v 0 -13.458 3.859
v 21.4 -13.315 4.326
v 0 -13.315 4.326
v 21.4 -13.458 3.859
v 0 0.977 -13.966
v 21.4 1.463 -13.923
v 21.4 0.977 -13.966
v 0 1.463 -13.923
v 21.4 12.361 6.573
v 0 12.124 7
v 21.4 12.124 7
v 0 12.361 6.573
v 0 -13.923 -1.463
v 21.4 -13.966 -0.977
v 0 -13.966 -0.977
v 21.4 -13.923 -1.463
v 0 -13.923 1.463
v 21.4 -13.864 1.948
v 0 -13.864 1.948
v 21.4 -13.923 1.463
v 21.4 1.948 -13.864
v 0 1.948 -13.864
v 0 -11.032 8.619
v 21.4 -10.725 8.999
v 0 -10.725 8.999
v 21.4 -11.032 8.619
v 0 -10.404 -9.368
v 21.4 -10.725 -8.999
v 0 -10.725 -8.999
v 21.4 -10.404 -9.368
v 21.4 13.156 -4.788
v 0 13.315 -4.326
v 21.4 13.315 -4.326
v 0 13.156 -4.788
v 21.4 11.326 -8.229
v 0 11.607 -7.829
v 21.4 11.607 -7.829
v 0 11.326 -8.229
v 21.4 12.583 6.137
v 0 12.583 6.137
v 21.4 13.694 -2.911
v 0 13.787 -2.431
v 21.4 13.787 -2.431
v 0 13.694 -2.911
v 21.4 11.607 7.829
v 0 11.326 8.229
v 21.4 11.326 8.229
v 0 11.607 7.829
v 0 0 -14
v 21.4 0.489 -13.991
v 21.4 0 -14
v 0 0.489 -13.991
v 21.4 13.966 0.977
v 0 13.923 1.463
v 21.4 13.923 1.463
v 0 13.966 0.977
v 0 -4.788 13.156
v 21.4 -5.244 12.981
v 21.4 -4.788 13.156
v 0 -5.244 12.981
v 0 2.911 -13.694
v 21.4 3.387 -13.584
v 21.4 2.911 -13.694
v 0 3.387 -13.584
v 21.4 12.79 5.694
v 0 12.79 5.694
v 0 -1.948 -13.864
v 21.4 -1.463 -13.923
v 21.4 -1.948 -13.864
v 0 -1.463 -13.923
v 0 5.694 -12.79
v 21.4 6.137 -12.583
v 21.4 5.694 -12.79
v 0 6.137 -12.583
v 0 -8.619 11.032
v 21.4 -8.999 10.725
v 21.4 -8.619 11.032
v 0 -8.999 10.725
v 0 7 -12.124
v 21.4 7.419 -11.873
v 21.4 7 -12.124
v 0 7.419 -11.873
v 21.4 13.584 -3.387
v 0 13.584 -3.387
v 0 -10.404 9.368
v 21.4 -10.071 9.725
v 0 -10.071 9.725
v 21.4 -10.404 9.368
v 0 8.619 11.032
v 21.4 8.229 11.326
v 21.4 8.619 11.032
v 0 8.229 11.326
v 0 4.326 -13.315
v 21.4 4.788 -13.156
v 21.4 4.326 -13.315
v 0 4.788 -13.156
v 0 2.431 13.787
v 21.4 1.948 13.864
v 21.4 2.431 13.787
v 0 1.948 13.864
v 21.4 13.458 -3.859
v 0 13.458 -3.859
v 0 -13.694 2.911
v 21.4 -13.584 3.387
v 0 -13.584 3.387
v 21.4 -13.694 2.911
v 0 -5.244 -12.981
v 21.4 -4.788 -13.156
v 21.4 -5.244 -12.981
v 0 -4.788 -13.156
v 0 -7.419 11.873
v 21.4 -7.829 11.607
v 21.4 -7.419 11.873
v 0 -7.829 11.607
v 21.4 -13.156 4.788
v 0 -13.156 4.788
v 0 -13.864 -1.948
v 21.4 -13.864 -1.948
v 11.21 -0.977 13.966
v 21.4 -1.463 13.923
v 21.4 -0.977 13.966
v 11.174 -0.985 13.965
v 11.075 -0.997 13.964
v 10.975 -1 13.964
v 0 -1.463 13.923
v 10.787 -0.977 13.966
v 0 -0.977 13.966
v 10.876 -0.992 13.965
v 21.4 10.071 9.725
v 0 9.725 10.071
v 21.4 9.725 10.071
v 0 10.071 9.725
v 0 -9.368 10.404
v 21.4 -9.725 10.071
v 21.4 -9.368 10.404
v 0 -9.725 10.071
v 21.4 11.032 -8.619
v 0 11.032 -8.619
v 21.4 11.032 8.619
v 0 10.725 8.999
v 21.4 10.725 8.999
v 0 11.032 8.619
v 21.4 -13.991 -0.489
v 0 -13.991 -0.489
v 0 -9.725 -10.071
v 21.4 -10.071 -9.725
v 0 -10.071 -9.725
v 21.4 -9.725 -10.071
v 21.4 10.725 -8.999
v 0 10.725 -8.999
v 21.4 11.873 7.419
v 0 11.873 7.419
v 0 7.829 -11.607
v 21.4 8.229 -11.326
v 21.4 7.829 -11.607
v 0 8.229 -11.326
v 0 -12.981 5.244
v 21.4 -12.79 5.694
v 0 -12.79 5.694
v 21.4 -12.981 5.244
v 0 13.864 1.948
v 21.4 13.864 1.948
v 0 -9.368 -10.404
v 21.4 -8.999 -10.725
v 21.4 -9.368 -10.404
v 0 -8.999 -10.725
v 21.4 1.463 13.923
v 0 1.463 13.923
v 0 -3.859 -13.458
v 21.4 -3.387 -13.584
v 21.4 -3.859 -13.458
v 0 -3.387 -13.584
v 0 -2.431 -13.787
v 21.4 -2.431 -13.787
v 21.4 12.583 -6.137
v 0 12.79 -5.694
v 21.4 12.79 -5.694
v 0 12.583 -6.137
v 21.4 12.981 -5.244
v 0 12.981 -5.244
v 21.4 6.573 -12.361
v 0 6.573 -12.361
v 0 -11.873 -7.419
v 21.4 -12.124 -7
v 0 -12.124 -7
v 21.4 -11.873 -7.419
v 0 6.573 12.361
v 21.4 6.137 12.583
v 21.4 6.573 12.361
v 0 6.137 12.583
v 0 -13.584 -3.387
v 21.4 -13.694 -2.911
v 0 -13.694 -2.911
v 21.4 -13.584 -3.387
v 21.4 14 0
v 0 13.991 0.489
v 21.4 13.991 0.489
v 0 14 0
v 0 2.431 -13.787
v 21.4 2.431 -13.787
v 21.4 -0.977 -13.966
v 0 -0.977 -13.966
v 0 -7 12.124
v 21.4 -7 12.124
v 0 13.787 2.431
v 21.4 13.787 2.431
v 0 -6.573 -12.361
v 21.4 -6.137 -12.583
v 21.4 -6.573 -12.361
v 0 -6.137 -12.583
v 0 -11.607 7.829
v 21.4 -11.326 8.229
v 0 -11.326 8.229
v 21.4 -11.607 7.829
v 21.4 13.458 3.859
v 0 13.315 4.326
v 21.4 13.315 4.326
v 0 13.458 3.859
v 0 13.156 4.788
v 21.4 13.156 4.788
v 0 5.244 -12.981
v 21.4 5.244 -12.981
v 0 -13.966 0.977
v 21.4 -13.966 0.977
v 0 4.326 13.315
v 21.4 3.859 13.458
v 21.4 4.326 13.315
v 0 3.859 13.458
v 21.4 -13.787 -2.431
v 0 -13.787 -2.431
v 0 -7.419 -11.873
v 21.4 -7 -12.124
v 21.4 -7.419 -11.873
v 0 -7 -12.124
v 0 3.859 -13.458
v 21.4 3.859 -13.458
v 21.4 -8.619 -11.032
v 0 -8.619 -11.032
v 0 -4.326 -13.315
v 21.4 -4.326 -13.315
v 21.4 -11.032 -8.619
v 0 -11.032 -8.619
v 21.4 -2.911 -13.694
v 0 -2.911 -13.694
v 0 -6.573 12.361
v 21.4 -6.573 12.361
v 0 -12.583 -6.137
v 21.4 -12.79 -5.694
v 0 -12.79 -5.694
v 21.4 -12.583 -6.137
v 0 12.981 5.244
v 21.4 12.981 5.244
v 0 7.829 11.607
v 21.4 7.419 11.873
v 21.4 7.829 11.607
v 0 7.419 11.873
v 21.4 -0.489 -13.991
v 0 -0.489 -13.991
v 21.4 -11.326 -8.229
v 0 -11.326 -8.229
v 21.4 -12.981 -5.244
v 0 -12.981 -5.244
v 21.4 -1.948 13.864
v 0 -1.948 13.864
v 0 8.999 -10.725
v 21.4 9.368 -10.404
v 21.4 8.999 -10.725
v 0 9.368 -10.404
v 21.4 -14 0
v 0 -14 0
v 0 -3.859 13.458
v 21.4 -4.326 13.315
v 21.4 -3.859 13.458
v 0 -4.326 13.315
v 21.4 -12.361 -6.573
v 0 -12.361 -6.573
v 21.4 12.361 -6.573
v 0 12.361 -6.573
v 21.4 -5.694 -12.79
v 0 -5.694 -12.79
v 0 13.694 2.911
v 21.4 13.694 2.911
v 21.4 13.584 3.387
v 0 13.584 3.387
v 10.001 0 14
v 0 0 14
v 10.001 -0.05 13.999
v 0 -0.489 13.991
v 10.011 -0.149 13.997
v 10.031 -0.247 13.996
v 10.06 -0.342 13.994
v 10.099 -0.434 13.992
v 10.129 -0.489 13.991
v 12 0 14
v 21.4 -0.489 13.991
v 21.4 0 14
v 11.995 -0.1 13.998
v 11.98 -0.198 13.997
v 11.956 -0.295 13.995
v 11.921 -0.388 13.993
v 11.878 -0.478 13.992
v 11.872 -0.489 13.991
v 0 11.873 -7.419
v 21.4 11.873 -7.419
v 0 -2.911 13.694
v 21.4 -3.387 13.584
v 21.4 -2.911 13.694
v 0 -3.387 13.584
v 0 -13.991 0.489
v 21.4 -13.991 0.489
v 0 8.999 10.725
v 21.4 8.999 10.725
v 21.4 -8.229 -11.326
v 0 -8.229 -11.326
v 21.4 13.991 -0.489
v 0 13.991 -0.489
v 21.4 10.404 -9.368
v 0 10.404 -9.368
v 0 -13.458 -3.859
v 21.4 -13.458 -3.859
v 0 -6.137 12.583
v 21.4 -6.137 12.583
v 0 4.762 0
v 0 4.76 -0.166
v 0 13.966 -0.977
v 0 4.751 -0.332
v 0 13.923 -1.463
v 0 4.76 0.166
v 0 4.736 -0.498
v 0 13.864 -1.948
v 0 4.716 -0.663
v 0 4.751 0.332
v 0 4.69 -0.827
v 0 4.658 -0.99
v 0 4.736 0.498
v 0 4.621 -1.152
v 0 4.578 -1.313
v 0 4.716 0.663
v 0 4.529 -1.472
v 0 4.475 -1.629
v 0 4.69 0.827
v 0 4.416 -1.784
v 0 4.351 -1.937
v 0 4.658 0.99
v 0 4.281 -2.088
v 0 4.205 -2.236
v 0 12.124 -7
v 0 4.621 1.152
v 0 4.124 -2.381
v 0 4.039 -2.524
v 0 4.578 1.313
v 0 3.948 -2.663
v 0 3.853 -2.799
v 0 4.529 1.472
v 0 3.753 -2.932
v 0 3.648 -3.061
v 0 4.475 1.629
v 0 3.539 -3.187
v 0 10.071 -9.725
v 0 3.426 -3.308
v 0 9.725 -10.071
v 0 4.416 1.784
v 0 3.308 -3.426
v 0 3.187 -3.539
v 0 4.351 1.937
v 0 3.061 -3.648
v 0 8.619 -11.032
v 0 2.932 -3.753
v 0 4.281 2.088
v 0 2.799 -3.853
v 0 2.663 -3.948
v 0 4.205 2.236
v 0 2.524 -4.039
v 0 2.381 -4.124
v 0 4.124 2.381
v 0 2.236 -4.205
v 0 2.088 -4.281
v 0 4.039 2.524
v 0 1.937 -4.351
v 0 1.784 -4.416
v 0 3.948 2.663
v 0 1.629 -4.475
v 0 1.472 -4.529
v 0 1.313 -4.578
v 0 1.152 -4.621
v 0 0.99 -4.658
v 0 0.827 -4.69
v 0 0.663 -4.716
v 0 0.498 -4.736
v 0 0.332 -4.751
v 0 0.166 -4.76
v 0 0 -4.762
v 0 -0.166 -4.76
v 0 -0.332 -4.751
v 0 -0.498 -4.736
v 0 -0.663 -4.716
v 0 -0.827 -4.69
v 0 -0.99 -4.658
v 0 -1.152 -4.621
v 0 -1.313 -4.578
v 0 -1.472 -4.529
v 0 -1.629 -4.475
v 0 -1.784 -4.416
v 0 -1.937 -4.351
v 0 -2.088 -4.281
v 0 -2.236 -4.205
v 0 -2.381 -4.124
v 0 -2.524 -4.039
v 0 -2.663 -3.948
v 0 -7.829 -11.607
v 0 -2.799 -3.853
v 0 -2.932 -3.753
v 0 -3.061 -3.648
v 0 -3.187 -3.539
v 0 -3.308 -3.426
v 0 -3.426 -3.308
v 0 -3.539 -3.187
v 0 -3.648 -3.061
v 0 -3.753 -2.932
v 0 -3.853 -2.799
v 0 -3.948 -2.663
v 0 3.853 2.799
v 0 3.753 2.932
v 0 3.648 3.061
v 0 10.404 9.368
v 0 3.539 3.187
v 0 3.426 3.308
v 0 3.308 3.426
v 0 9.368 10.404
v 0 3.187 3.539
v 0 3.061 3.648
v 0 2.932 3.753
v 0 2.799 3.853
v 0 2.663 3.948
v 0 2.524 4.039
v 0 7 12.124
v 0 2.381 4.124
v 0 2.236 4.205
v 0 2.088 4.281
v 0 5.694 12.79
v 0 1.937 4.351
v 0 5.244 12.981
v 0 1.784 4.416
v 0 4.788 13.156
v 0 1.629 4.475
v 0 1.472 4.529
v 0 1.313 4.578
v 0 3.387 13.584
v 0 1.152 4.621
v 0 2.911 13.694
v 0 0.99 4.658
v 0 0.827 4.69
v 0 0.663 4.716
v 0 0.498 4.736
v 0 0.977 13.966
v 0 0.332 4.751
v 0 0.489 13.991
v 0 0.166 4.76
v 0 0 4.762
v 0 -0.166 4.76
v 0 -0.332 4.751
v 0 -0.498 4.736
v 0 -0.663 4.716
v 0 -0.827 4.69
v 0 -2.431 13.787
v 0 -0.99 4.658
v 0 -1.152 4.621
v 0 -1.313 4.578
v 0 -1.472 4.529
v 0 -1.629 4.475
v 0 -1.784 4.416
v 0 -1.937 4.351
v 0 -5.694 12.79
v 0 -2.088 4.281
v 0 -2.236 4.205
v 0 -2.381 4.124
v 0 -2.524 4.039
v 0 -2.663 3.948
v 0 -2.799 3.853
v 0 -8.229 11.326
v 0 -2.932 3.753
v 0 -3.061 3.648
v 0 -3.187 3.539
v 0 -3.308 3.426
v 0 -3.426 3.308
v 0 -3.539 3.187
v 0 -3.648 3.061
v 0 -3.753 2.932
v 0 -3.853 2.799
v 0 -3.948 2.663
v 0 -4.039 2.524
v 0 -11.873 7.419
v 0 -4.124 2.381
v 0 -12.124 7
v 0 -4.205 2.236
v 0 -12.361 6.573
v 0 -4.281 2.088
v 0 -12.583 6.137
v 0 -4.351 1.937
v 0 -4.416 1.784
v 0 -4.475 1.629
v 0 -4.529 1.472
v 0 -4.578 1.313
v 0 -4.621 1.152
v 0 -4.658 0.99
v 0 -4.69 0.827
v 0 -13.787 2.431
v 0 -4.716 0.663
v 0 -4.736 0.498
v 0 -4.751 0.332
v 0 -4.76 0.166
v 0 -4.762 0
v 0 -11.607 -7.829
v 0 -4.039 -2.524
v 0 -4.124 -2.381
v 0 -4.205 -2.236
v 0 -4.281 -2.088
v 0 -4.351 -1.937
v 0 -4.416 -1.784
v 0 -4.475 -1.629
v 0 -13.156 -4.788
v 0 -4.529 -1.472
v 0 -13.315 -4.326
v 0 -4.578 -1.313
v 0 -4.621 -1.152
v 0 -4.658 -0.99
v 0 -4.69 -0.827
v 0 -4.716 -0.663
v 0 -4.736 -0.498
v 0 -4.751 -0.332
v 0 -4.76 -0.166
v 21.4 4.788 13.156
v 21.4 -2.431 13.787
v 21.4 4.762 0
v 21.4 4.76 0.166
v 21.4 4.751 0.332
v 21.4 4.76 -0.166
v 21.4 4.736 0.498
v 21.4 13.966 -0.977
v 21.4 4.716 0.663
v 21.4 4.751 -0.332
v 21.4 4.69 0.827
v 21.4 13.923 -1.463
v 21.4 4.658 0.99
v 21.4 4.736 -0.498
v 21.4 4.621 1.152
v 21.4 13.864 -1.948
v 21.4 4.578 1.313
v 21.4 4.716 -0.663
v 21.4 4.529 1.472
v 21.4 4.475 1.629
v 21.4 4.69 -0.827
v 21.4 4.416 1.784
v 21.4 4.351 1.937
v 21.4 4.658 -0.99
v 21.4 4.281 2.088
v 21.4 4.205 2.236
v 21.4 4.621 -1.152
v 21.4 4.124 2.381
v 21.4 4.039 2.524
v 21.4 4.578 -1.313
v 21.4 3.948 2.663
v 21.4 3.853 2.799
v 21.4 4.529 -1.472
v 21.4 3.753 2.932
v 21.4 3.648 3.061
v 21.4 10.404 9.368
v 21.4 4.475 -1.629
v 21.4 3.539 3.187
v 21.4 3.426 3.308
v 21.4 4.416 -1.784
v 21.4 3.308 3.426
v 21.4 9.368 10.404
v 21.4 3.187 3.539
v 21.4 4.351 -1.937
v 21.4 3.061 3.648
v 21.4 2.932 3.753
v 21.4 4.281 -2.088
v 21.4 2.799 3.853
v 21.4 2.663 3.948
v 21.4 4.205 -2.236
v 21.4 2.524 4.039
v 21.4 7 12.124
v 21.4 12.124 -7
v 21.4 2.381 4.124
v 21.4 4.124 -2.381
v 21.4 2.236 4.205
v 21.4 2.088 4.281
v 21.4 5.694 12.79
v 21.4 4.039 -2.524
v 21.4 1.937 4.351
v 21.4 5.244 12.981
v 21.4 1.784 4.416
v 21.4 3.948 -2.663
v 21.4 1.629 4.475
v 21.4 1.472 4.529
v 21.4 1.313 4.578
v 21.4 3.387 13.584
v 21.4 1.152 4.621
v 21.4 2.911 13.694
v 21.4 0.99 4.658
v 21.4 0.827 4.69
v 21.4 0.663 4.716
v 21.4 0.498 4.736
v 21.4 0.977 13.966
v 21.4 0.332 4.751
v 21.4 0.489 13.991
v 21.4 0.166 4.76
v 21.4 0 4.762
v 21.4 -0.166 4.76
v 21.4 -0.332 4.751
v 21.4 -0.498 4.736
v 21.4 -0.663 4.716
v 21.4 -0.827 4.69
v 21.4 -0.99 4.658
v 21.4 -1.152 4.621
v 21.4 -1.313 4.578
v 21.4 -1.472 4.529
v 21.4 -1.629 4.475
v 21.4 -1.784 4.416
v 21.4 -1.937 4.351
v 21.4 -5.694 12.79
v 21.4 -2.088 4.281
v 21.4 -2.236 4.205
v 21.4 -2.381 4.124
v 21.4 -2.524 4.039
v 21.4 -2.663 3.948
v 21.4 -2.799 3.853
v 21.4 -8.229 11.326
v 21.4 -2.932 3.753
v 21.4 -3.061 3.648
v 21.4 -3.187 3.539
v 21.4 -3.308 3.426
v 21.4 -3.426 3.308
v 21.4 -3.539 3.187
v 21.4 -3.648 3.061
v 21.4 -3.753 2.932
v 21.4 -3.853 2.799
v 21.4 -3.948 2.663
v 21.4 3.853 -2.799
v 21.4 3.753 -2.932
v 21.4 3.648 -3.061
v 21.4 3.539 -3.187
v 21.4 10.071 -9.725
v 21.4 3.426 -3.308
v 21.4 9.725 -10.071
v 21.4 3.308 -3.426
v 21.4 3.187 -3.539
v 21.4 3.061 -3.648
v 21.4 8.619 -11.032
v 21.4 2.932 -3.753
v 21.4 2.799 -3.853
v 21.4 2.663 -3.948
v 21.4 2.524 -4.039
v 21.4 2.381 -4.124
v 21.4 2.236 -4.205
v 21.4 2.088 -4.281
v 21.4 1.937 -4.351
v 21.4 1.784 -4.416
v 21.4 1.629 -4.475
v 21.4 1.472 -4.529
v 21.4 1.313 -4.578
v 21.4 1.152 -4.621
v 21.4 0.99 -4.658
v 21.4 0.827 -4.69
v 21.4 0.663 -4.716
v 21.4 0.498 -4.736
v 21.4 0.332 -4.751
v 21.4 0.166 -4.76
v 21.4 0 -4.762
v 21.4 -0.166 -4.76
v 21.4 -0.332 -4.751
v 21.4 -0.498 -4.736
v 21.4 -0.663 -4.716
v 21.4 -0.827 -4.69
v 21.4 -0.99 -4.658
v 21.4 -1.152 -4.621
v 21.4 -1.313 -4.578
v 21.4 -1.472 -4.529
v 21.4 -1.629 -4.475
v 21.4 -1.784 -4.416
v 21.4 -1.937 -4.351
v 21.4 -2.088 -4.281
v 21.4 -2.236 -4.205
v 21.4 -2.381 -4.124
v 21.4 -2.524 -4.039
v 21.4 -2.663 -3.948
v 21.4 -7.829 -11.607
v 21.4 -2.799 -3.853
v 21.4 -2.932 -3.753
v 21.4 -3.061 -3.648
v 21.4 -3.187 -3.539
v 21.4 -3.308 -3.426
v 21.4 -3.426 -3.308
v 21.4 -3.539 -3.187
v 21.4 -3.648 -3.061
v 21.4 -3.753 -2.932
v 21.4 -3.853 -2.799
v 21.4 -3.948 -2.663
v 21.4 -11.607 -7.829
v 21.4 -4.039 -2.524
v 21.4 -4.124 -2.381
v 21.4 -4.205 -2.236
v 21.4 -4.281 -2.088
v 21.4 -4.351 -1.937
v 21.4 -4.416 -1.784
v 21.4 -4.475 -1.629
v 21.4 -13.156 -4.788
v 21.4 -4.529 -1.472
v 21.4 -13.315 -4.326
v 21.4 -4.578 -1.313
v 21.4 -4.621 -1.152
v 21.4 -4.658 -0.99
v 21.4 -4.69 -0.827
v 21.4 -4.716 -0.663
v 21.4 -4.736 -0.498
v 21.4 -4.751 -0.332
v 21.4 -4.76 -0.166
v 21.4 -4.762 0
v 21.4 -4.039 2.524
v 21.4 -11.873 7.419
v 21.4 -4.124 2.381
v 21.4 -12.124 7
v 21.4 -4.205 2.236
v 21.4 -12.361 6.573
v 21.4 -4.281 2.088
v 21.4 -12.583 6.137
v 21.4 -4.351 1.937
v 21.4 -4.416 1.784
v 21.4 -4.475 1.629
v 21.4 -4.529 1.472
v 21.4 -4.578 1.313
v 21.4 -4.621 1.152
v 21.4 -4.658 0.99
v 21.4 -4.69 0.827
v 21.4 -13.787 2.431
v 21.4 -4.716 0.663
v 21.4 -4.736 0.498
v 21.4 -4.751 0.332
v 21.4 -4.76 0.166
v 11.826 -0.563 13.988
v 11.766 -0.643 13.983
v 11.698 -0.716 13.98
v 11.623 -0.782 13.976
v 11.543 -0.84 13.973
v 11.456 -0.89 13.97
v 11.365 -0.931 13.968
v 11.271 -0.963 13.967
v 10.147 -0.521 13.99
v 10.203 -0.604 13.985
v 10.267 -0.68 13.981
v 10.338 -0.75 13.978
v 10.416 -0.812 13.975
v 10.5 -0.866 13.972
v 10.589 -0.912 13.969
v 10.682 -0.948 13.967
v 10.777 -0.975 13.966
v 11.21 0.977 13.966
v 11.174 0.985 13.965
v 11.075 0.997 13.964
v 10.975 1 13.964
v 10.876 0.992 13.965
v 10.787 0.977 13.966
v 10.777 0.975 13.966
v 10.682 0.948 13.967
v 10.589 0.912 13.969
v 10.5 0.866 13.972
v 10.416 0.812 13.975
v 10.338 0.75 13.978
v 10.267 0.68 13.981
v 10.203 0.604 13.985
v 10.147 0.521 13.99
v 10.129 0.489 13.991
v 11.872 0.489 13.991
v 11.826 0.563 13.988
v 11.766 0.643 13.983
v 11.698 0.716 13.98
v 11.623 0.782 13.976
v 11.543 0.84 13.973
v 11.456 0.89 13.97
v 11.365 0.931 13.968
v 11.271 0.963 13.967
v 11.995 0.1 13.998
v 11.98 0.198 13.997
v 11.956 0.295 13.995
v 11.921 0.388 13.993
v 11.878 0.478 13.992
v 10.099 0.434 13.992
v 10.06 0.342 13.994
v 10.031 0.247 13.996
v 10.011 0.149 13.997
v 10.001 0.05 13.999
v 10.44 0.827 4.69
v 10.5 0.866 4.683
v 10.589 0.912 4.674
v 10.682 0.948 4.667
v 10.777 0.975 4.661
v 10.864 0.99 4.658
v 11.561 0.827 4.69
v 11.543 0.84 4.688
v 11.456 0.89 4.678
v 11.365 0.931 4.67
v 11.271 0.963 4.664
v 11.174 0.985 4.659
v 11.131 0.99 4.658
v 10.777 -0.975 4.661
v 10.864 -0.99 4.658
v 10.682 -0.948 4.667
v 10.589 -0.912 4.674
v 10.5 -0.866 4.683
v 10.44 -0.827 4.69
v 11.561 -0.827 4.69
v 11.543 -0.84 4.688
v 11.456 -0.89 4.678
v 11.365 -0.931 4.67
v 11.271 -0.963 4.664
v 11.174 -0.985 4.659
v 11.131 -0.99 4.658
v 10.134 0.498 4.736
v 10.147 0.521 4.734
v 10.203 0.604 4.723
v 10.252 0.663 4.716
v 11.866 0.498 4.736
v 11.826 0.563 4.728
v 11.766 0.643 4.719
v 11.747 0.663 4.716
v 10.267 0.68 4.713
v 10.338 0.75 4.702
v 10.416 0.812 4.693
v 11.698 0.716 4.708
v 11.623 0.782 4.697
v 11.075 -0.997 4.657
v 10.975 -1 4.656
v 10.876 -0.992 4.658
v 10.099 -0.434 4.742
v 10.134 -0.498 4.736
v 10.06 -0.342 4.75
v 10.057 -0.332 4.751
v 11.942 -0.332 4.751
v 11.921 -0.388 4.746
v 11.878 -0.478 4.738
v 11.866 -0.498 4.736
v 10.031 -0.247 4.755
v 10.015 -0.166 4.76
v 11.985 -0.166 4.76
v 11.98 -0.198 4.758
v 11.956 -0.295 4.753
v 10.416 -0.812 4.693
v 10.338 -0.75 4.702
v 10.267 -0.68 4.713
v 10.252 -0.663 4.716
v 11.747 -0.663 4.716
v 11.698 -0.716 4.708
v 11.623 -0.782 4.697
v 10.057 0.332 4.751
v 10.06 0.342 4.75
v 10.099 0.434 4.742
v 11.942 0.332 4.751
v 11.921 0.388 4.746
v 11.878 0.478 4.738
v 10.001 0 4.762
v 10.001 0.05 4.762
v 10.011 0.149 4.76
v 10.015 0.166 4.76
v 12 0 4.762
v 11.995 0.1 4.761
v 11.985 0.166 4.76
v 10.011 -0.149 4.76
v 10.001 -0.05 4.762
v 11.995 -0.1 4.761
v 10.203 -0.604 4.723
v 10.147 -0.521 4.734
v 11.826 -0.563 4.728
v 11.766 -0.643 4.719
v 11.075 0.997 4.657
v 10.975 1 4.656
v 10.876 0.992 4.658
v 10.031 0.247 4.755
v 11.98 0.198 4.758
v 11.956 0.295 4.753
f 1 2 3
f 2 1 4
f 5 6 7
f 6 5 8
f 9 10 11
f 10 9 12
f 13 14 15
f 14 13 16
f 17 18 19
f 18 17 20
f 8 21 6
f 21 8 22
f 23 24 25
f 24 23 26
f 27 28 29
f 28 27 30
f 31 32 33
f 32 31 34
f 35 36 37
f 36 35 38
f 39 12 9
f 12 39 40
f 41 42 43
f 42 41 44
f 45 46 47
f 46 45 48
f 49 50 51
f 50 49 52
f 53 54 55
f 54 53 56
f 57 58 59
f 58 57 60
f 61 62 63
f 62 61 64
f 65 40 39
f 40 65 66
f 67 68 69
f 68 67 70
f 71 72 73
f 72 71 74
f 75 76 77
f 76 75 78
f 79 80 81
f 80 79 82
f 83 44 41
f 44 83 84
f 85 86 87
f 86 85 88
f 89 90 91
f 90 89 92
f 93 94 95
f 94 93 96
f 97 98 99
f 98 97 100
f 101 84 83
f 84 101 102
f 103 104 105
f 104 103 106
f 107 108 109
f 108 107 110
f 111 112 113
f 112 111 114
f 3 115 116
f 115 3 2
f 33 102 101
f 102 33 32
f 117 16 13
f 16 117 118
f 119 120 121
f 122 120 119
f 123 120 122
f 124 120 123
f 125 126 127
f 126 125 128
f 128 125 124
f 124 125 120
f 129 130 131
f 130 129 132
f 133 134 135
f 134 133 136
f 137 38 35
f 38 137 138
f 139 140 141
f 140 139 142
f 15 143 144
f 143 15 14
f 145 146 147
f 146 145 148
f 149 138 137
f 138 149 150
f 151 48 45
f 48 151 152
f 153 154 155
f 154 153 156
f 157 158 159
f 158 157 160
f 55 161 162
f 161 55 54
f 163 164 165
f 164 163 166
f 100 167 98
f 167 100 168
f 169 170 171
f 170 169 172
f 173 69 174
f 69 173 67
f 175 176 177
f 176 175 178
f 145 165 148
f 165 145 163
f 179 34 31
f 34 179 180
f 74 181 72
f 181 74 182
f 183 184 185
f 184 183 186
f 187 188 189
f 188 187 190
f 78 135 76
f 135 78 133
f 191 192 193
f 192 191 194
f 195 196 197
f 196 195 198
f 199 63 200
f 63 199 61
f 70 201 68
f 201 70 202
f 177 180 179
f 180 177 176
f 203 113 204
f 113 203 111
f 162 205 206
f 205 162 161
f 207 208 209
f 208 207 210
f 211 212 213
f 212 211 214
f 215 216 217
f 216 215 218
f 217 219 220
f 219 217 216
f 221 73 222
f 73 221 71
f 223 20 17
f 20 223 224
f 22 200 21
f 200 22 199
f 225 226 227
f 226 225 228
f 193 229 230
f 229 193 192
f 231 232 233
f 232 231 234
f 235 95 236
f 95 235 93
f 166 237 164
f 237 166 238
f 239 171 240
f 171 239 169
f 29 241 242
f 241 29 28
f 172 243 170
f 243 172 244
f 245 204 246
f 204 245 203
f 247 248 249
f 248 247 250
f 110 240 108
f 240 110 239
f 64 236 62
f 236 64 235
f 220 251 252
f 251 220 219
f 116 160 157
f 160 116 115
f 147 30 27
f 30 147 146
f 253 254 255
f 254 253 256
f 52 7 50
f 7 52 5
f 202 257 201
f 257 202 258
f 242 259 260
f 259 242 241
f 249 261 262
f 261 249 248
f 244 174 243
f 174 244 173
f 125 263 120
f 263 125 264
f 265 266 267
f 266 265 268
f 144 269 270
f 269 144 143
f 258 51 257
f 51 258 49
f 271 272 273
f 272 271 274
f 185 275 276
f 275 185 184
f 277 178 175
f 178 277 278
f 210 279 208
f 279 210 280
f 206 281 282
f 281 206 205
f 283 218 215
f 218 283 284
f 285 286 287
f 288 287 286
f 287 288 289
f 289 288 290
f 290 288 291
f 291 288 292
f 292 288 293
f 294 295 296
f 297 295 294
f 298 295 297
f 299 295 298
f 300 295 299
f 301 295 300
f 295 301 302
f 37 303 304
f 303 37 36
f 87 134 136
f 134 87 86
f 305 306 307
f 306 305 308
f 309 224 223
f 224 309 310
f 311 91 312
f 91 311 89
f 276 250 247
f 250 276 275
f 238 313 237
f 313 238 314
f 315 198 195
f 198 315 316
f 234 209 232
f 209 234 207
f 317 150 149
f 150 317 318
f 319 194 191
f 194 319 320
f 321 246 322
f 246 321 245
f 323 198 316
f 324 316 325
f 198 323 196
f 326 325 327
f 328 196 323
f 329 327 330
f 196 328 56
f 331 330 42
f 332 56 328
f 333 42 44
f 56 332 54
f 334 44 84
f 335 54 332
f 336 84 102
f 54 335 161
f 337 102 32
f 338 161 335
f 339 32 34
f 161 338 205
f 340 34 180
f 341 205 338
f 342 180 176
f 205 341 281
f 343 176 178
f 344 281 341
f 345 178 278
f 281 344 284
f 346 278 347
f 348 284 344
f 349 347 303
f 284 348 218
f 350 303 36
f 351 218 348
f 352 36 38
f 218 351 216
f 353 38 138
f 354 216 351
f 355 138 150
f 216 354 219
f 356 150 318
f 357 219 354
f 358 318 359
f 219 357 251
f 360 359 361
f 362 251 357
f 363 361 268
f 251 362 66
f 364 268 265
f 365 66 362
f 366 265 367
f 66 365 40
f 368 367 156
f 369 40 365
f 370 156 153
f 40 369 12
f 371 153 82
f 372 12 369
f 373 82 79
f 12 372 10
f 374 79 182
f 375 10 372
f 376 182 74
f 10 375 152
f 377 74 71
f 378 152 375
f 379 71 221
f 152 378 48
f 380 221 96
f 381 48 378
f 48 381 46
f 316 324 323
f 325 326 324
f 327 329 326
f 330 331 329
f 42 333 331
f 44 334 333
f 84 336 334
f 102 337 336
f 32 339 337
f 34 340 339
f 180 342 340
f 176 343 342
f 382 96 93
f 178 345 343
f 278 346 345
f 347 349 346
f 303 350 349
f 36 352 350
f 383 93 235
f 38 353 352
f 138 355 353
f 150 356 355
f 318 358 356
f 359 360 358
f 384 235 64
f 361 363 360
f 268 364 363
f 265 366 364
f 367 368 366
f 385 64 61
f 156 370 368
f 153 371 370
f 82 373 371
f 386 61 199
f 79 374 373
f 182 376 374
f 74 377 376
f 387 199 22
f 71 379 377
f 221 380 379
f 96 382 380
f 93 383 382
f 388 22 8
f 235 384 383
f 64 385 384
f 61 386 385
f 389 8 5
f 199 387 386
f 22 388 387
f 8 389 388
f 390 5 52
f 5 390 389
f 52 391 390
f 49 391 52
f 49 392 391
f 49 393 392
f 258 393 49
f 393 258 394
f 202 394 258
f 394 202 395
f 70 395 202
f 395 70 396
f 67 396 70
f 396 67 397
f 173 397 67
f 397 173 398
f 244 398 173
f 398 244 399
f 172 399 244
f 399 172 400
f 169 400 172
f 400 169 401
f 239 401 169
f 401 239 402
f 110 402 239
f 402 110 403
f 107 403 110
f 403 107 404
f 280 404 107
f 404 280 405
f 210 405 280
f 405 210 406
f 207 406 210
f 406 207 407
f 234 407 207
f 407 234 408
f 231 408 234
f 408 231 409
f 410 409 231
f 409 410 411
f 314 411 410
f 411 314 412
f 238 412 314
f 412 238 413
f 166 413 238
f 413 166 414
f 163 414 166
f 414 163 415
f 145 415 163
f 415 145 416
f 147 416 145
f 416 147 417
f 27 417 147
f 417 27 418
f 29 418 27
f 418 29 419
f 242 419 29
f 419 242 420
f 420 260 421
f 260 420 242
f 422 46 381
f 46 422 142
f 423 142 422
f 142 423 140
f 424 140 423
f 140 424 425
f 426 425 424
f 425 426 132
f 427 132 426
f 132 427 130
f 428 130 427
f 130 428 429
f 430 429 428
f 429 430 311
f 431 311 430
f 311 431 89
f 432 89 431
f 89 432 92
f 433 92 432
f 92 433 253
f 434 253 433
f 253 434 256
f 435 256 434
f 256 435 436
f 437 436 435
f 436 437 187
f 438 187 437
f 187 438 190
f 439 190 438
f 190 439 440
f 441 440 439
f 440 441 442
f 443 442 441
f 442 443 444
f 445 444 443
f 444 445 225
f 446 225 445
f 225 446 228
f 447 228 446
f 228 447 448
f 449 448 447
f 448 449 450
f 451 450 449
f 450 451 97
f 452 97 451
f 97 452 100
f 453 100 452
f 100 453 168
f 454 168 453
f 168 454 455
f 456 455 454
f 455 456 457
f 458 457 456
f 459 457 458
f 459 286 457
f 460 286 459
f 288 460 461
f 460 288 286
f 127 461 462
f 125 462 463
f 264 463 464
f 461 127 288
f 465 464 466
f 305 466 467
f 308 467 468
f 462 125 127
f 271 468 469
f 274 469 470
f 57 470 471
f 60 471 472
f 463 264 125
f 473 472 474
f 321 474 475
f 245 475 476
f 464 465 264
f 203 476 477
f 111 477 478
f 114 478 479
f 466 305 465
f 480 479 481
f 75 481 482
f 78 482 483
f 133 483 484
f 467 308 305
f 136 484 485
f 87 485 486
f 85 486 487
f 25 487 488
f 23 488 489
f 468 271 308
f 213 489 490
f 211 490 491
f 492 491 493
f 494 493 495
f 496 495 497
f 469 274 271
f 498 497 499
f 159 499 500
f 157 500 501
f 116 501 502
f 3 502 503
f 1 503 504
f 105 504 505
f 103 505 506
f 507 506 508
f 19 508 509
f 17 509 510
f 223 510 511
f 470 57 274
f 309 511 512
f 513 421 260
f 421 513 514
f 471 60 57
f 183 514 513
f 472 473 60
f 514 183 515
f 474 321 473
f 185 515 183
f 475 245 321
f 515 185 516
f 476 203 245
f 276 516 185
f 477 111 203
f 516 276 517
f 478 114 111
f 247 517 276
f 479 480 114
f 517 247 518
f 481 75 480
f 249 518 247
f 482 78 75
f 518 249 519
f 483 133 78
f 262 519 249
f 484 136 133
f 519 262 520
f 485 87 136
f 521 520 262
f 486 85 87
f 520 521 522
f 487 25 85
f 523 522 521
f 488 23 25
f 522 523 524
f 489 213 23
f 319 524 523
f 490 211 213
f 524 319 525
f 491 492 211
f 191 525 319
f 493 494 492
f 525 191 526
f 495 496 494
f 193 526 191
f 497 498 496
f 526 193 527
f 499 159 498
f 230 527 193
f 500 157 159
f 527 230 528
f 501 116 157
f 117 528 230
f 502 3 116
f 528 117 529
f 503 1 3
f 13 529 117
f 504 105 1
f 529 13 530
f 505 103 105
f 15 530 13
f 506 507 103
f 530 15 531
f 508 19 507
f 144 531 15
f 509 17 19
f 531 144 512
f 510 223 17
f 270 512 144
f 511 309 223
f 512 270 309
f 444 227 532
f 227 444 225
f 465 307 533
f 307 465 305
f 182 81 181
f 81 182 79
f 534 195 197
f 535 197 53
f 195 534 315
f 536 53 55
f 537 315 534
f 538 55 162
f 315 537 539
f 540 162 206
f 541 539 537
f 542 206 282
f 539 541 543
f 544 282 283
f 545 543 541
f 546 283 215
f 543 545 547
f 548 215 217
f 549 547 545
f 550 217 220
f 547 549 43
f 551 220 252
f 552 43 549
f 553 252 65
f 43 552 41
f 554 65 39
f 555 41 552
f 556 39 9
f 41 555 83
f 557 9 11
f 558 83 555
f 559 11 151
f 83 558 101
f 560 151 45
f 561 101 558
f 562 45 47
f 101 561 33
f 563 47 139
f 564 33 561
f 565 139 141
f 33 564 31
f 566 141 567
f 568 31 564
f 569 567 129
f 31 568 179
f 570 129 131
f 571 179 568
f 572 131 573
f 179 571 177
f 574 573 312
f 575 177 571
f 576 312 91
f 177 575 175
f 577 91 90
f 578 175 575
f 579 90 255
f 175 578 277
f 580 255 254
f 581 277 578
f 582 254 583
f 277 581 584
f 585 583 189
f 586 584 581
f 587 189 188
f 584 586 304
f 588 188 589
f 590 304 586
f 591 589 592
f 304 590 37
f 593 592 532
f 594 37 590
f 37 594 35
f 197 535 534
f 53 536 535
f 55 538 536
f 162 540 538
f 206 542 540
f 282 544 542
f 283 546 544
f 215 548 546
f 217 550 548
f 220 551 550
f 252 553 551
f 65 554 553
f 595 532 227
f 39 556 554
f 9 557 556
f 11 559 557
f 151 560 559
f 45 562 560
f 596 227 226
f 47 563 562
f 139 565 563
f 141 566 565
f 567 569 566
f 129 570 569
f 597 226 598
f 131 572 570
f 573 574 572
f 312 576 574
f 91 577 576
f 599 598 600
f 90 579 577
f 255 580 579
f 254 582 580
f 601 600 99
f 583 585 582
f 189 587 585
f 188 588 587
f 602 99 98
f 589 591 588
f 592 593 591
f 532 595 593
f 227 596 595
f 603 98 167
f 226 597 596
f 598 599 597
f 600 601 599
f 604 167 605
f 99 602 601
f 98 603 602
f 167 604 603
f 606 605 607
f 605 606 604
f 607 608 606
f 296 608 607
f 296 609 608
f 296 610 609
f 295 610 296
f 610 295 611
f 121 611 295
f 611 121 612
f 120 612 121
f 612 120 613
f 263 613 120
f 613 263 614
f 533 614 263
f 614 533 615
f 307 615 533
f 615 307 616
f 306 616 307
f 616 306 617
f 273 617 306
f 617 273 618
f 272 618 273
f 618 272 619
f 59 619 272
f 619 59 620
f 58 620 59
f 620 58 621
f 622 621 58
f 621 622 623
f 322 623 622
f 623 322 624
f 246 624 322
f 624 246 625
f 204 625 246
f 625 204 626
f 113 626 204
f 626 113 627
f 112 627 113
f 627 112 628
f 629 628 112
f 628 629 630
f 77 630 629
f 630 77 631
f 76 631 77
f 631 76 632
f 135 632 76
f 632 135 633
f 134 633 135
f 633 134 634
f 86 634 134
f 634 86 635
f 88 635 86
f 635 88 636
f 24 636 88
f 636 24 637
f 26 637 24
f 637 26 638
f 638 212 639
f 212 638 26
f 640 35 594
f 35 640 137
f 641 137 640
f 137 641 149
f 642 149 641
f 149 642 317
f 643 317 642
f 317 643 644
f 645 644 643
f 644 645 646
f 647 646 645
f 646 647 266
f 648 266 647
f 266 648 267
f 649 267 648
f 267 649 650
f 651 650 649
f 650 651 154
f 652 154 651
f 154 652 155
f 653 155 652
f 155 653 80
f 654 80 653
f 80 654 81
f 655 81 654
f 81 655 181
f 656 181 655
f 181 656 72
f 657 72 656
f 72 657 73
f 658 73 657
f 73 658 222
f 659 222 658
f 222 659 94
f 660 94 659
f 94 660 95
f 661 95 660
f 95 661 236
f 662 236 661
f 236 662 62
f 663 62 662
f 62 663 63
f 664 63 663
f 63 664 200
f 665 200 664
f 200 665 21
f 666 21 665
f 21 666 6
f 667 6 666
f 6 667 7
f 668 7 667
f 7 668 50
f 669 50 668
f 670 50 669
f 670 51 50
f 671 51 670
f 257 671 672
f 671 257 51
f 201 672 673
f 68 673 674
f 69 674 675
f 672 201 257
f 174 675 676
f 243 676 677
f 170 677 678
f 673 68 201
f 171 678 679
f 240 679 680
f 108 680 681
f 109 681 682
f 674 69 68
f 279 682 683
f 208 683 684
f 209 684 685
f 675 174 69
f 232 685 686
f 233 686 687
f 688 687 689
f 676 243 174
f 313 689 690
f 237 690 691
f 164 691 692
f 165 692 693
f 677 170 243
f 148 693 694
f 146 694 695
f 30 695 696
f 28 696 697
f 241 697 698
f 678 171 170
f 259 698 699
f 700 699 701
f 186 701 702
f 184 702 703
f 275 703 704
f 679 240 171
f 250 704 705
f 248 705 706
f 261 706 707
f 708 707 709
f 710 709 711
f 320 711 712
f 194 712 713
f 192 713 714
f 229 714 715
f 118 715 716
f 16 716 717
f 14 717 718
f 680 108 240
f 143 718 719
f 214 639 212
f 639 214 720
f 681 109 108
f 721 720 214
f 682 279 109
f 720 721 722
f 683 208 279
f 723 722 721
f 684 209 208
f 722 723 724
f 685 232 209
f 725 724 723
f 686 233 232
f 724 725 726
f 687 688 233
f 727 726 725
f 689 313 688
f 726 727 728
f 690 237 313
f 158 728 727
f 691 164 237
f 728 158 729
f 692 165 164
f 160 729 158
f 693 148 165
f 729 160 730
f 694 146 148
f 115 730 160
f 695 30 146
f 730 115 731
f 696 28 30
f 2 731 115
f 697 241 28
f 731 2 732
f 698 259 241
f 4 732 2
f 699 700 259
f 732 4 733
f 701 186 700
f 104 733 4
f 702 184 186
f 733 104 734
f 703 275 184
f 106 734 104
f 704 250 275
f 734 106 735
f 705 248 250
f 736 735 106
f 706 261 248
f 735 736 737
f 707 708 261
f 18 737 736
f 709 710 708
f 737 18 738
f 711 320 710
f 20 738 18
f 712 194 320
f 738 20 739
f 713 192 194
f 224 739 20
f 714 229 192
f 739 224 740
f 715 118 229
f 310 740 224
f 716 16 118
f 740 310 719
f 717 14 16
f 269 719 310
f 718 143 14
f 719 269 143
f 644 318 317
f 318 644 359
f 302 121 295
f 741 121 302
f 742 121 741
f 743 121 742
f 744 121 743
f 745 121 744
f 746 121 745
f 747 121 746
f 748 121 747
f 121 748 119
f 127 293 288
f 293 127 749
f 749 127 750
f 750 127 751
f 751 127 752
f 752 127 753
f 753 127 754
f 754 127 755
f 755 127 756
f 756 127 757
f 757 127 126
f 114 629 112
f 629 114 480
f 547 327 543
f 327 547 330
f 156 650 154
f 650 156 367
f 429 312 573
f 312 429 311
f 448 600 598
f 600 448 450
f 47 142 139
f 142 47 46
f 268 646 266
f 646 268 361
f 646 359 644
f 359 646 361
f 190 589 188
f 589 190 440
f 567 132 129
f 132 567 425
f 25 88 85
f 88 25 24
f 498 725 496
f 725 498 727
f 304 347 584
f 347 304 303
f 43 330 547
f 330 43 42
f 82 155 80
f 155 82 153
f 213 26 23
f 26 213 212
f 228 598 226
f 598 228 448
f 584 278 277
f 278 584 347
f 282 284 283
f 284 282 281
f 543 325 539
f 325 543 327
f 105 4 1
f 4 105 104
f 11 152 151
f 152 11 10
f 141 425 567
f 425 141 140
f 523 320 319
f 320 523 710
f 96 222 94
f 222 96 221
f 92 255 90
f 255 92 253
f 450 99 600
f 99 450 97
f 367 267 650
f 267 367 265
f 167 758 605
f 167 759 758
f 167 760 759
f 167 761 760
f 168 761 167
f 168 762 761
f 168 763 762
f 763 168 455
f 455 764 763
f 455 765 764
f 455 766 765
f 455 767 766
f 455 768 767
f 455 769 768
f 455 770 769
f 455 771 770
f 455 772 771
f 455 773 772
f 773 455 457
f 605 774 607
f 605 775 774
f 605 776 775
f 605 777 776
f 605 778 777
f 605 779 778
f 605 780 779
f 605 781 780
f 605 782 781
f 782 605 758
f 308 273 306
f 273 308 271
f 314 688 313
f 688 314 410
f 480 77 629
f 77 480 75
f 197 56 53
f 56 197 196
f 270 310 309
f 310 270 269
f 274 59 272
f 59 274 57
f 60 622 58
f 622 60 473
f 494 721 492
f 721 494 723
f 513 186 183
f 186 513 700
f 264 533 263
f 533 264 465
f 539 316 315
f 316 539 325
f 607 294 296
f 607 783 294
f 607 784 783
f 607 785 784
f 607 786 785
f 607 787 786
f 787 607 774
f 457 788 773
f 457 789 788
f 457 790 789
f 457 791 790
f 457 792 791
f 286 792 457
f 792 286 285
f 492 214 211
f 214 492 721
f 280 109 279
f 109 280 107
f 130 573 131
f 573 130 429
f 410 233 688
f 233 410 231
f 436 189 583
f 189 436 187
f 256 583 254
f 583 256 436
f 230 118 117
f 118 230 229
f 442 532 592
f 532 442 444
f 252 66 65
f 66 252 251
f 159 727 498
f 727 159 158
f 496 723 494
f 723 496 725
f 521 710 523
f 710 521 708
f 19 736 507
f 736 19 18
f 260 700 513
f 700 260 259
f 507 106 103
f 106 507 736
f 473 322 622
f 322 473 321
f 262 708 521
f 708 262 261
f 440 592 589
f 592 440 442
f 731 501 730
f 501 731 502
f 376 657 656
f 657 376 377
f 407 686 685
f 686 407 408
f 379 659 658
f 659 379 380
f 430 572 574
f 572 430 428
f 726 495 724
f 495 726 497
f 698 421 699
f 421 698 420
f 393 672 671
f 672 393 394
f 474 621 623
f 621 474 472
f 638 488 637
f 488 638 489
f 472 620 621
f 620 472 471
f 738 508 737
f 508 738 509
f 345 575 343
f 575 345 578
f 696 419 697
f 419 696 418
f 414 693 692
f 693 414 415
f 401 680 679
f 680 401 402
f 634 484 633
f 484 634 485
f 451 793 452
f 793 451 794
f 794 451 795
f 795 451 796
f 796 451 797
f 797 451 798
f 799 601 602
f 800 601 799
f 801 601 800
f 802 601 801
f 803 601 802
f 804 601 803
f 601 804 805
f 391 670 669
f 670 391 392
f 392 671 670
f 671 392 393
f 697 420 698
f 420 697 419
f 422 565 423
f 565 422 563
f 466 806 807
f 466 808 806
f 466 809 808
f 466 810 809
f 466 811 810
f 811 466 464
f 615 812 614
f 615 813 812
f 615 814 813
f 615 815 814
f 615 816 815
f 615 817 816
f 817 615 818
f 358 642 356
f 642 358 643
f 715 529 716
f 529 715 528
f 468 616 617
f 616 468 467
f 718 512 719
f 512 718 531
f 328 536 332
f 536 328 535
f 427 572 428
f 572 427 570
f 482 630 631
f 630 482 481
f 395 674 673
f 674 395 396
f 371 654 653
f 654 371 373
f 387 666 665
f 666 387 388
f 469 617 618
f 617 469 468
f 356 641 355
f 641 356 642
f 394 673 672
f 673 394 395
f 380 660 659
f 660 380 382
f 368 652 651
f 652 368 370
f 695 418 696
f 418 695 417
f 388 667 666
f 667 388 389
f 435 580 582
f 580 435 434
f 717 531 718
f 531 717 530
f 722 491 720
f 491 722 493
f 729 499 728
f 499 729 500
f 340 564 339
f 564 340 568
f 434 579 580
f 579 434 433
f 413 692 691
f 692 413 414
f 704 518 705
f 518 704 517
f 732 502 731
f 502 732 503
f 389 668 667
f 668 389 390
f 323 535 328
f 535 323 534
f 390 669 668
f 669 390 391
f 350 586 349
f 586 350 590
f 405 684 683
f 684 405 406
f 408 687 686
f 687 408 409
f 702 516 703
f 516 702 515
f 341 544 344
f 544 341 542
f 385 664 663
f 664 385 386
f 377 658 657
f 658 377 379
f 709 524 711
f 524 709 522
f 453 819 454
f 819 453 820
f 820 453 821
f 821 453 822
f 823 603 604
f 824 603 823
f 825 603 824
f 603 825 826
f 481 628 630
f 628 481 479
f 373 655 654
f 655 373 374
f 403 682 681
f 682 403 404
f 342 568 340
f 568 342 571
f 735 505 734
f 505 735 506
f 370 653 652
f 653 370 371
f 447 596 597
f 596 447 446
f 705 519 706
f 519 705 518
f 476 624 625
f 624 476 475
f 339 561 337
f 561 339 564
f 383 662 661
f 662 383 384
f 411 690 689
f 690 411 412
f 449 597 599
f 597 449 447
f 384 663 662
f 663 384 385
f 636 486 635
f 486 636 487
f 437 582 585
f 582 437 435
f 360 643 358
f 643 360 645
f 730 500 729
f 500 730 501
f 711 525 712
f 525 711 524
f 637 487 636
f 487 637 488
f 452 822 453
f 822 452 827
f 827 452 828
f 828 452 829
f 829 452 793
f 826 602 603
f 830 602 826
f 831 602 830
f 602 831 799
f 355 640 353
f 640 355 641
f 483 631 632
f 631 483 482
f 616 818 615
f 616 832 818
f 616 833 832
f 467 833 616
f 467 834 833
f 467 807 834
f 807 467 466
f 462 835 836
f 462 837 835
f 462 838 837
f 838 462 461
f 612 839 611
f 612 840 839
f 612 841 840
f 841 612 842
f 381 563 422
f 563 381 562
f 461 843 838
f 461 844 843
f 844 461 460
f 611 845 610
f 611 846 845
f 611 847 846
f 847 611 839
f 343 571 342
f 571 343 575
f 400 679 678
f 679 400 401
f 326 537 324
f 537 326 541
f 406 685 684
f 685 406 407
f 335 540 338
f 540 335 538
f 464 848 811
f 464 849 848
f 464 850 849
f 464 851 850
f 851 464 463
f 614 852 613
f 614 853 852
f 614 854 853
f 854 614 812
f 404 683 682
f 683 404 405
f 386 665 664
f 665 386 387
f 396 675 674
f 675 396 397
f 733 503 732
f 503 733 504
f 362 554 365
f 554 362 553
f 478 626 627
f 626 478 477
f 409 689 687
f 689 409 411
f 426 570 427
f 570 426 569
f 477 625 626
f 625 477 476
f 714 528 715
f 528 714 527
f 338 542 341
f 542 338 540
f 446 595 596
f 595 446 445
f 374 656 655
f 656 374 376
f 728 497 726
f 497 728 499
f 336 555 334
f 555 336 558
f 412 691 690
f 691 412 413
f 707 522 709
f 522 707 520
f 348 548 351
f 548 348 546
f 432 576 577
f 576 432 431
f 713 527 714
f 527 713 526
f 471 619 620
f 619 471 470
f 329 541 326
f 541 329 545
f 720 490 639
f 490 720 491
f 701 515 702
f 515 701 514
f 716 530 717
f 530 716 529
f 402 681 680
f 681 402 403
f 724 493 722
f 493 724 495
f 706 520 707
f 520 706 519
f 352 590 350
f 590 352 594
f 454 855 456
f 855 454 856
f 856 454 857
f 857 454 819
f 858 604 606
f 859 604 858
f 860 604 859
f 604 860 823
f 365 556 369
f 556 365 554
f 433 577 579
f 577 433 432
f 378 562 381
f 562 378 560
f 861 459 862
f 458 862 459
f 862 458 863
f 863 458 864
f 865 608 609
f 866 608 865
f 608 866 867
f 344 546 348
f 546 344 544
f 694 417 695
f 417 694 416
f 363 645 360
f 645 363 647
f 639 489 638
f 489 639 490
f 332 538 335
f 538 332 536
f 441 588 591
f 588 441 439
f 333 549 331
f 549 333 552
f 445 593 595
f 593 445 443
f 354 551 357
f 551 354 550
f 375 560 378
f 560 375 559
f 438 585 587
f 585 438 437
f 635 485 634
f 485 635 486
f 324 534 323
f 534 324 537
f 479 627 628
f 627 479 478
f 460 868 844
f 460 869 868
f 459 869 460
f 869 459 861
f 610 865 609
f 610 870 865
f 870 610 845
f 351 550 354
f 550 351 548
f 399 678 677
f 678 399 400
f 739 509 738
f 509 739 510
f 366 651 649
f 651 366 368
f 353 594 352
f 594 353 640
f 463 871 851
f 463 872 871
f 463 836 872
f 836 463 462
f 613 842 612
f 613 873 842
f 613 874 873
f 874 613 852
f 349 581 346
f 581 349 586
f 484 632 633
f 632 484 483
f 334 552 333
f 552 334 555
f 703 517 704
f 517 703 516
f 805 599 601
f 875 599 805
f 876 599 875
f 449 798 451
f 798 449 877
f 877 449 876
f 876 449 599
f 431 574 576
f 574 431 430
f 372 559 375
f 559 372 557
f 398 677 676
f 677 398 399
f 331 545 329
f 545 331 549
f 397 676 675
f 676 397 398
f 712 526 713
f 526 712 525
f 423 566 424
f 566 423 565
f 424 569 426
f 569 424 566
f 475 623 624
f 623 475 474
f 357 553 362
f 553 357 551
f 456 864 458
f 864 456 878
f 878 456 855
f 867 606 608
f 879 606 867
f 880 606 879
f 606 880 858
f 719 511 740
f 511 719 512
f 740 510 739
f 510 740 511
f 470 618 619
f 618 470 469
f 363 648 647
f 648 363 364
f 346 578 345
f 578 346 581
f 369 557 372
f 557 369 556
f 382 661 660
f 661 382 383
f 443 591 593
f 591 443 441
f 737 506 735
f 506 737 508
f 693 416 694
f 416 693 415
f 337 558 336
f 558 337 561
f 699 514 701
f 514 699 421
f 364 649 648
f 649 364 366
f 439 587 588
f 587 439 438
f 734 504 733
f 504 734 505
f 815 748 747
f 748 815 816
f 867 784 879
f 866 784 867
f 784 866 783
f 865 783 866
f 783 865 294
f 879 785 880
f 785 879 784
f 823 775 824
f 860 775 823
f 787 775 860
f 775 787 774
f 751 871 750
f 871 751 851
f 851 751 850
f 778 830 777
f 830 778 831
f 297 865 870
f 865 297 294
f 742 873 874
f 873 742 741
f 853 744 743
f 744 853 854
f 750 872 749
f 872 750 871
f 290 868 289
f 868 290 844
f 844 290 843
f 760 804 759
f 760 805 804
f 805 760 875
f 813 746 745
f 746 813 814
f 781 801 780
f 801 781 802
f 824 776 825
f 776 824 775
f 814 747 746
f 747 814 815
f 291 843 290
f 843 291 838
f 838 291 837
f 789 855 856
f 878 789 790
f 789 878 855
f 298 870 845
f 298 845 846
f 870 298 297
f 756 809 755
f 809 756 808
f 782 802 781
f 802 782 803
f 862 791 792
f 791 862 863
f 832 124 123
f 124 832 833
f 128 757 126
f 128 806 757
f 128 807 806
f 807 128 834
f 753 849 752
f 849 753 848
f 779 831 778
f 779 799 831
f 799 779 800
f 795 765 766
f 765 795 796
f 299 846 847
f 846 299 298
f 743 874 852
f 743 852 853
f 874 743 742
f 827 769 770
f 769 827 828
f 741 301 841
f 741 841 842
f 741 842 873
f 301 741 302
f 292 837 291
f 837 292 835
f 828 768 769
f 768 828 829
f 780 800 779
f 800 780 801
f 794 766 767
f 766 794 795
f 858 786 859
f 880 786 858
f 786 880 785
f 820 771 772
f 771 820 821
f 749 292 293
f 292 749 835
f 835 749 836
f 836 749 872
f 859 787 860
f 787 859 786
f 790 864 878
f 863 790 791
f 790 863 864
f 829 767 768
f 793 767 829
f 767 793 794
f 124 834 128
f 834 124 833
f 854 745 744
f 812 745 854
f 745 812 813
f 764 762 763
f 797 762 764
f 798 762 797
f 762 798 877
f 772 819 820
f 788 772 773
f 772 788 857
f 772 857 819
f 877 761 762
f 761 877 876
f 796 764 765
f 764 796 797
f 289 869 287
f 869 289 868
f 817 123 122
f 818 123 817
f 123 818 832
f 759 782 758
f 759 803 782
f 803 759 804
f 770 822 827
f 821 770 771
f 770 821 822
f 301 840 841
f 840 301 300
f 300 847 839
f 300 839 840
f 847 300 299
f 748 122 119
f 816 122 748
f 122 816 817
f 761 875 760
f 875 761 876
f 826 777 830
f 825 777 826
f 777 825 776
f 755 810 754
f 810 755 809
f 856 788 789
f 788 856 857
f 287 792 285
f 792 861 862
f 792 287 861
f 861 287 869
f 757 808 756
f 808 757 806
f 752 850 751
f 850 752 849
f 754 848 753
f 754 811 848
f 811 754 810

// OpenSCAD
// file: ../lib/common.scad
// Shared helpers for the AR turntable part models.
//
// Every part file holds a parameter table P. Each row is:
//   [id, description, value_mm, evidence, display_unit, source_or_how_to_check]
//
// Evidence codes:
//   F  factory document          O  owner report
//   C  community drawing         S  industry standard
//   D  design choice             M  measured for this repository
//   DV derived from cited sources, not yet verified on a part. The source
//      column holds the derivation: the formula, each input with its source,
//      and how to verify. Drawn in blue. Needs a row in TO-CONFIRM.md whose
//      value starts with "Derived:". Change to M once measured.
//   PH placeholder: chosen only so the model has a shape. It is NOT a
//      measurement. Drawn in red. Replace it, and change the code, once it
//      is measured.
//
// Every part file also emits metadata naming the part page, the part, the
// version, the material and the tables it fits, each fit with its evidence:
//   ["part", "parts/counterweight.md"], ["part_name", "Counterweight"],
//   ["version", "XA brass weight, 1961 to 1979"], ["material", "Brass"],
//   ["fits", [["XA", "Fitted by AR", "XA service manual p. 4"], ["XB", "Unconfirmed", ""]]]
// The fit word is one of: Fitted by AR, Fits, Fits with a change, Does not
// fit, Unconfirmed. build.py prints these in the title block and writes the
// drawings table of cad/README.md from them.
// License: CC BY-SA 4.0. See LICENSE at the repository root.

IN = 25.4;      // one inch, in mm. All model geometry is in mm.
EPS = 0.01;     // overlap so boolean cuts do not leave zero-thickness skins
$fa = 2;
$fs = 0.1;

// Value of parameter `id` in table t.
function pv(t, id) = t[search([id], t)[0]][2];

// Print part data for cad/tools/build.py, which reads it from the console.
module emit(meta, params, dims = []) {
    echo(META = meta);
    for (row = params) echo(PARAM = row);
    for (row = dims) echo(DIM = row);
}

// Rounded rectangle prism: centered in XY, from z = 0 to z = h.
module rr_prism(l, w, h, r) {
    translate([-l / 2 + r, -w / 2, 0]) cube([l - 2 * r, w, h]);
    translate([-l / 2, -w / 2 + r, 0]) cube([l, w - 2 * r, h]);
    for (sx = [-1, 1], sy = [-1, 1])
        translate([sx * (l / 2 - r), sy * (w / 2 - r), 0]) cylinder(r = r, h = h);
}

// Slot along X: `c` is the distance between end-radius centers.
module slot_prism(c, w, h) {
    translate([-c / 2, -w / 2, 0]) cube([c, w, h]);
    for (sx = [-1, 1]) translate([sx * c / 2, 0, 0]) cylinder(d = w, h = h);
}
// main file
// AR tonearm counterweight: one parametric model, one drawing per version and material.
//
// The part is defined by its mass, not its outline. The model takes the target
// mass, the material density, the bore and the outside diameter, and computes
// the length:
//     length = mass / (density x pi/4 x (OD^2 - bore^2)),
// then adds the length that replaces the metal removed by the locking hole.
// Only the XA version is built, from one owner's report: parts/counterweight.md.
// XB and AR77XB versions are added when their masses are measured, not before.
// Parameter IDs match TO-CONFIRM.md.
// License: CC BY-SA 4.0. See LICENSE at the repository root.
include <../lib/common.scad>

variant = 1;   // 1 brass, 2 stainless steel, 3 aluminium
flat = false;

// [slug, material text, density g/cm3, density source]
materials = [
    ["brass", "Brass, alloy not established; the original is reported as brass",
     8.5, "Wikipedia Brass excerpt: 8.4 to 8.73 g/cm3 for brass; 8.5 used, inside that range"],
    ["stainless", "Stainless steel, 304 taken as the example",
     7.9, "Wikipedia SAE 304 stainless steel excerpt: 7,900 kg/m3"],
    ["aluminium", "Aluminium, 6061 taken as the example",
     2.70, "Wikipedia 6061 aluminium alloy excerpt: 2.70 g/cm3"],
];
mat = materials[variant - 1];

// Inputs. Each keeps its own evidence code in table P below.
mass = 98.8;            // CW1, g, with the set screw
od = 28;                // CW3, mm
bore = 0.375 * IN;      // CW5, 3/8 in entered as derived from the 9.5 mm report
rho = mat[2];           // CW15, g/cm3
lock_d = 2.0;           // CW8, placeholder
lock_x = 11;            // CW9, placeholder

// The formula. Volumes in mm3, density converted to g/mm3.
area = PI / 4 * (od * od - bore * bore);
len_plain = mass / (rho / 1000) / area;
lock_volume = PI / 4 * lock_d * lock_d * (od - bore) / 2;   // radial hole, surface to bore
len = round((len_plain + lock_volume / area) * 100) / 100;   // CW14, to 0.01 mm

P = [
    ["CW1", "Target mass, with the set screw", mass, "O", "g", "Owner report, one XA, parts/counterweight.md. The set screw is included: its own mass is CW2"],
    ["CW3", "Outside diameter", od, "O", "mm", "Owner report, one XA"],
    ["CW4", "Reported length along the bore, for comparison only", 22, "O", "mm", "Owner report, one XA. Not used by the model: compare with CW14"],
    ["CW5", "Bore diameter", bore, "DV", "in", "The reported 9.5 mm is within 0.03 mm of 3/8 in, and AR dimensioned in inches, so 3/8 in is entered. Verify: pin gauge on an original bore, and the arm stub diameter"],
    ["CW6", "Bore runs through and on center: assumed", len, "PH", "mm", "Inspect the part. Measure wall thickness around the bore"],
    ["CW8", "Locking-hole size, tap drill until thread is known", lock_d, "PH", "mm", "Gauge the set screw thread, then set the tap drill"],
    ["CW9", "Locking-hole position from the end face", lock_x, "PH", "mm", "Calipers, from one end of the weight"],
    ["CW15", "Density used", rho, "S", "g/cm3", mat[3]],
    ["CW14", "Length computed from the mass", len, "DV", "mm", str("CW1 / (CW15 x pi/4 x (CW3^2 - CW5^2)) = ", round(len_plain * 100) / 100, " mm, plus ", round(lock_volume / area * 100) / 100, " mm for the metal removed by the locking hole CW8. Verify: weigh the finished part; compare with CW4 on an original")],
];

// Axis along X so the top view shows the weight as it sits on the arm.
module part() {
    difference() {
        rotate([0, 90, 0]) cylinder(d = od, h = len);
        translate([-1, 0, 0]) rotate([0, 90, 0]) cylinder(d = bore, h = len + 2);
        translate([lock_x, 0, 0]) cylinder(d = lock_d, h = od);
    }
}

emit(
    [
        ["id", str("counterweight-xa-", mat[0])],
        ["title", str("Tonearm counterweight, XA mass, in ", mat[0] == "stainless" ? "stainless steel" : mat[0])],
        ["status", "PRELIMINARY"],
        ["part", "parts/counterweight.md"],
        ["part_name", "Counterweight"],
        ["version", variant == 1 ? "XA brass weight, 1961 to 1979" : str("XA weight remade in ", mat[0] == "stainless" ? "stainless steel" : mat[0], ": same mass, longer body")],
        ["material", mat[1]],
        ["density", rho],
        ["fits", variant == 1
            ? [["XA", "Fitted by AR", "XA service manual p. 4, item 22B part 952; brass per two owner reports"],
               ["XB", "Unconfirmed", ""], ["AR77XB", "Unconfirmed", ""]]
            : [["XA", "Fits with a change", str("the body is ", round(len * 10) / 10, " mm long instead of the reported 22 mm; whether the arm stub, arm rest and cover clear it is CW16 and CW17")],
               ["XB", "Unconfirmed", ""], ["AR77XB", "Unconfirmed", ""]]],
        ["scope", "One owner's XA. The XB and AR77XB counterweights differ and are not drawn"],
        ["make", "Turn, bore, cross-drill and tap. 1 off"],
        ["reference_mass_g", mass],
        ["formula", "length = mass / (density x pi/4 x (OD^2 - bore^2)), then add the length that replaces the metal removed by the locking hole"],
        ["final_check", "Final check is the scale: the finished part must weigh inside the range, whatever the drawing says."],
        ["variants", [[1, "XA mass in brass"], [2, "XA mass in stainless steel"], [3, "XA mass in aluminium"]]],
        ["views", ["front", "top", "right", "left", "iso"]],
        ["sections", [["A", "y", 0]]],
        ["notes", [
            "The part is defined by its mass. The 98.8 g value is one XA weight with its set screw; the range across originals is not known (CW11, CW12).",
            str("Model mass at ", rho, " g/cm3 is printed in the title block. It should equal CW1 within rounding; the difference is the set screw and the density guess."),
            "Bore fit, thread, and edge details are not established. 3/8 in is entered from a 9.5 mm owner value; it is not a fit on the arm stub.",
            variant == 1 ? "The computed length is 0.7 mm shorter than the reported 22 mm: the density is a range, and the set screw is in the 98.8 g." : "This is longer than the brass original. Check the arm stub length and the clearance to the arm rest and the cover before making it (CW16, CW17).",
            "Weigh the original with and without its screw before ordering: TO-CONFIRM.md, CW1 and CW2.",
        ]],
    ],
    P,
    [
        ["front", "h", [0, 0, 0], [len, 0, 0], -9, "CW14"],
        ["front", "v", [len, 0, -od / 2], [len, 0, od / 2], 10, "CW3", "Ø"],
        ["front", "h", [0, 0, od / 2], [lock_x, 0, od / 2], 9, "CW9"],
        ["front", "cl", [-4, 0, 0], [len + 4, 0, 0]],
        ["right", "d", [0, 0, 0], bore / 2, 9, "CW5", "Ø", 40],
        ["top", "d", [lock_x, 0, 0], lock_d / 2, 9, "CW8", "Ø", 60],
        ["A", "h", [0, 0, -bore / 2], [len, 0, -bore / 2], -9, "CW6", "THRU "],
    ]
);

if (flat) projection() part(); else part();
